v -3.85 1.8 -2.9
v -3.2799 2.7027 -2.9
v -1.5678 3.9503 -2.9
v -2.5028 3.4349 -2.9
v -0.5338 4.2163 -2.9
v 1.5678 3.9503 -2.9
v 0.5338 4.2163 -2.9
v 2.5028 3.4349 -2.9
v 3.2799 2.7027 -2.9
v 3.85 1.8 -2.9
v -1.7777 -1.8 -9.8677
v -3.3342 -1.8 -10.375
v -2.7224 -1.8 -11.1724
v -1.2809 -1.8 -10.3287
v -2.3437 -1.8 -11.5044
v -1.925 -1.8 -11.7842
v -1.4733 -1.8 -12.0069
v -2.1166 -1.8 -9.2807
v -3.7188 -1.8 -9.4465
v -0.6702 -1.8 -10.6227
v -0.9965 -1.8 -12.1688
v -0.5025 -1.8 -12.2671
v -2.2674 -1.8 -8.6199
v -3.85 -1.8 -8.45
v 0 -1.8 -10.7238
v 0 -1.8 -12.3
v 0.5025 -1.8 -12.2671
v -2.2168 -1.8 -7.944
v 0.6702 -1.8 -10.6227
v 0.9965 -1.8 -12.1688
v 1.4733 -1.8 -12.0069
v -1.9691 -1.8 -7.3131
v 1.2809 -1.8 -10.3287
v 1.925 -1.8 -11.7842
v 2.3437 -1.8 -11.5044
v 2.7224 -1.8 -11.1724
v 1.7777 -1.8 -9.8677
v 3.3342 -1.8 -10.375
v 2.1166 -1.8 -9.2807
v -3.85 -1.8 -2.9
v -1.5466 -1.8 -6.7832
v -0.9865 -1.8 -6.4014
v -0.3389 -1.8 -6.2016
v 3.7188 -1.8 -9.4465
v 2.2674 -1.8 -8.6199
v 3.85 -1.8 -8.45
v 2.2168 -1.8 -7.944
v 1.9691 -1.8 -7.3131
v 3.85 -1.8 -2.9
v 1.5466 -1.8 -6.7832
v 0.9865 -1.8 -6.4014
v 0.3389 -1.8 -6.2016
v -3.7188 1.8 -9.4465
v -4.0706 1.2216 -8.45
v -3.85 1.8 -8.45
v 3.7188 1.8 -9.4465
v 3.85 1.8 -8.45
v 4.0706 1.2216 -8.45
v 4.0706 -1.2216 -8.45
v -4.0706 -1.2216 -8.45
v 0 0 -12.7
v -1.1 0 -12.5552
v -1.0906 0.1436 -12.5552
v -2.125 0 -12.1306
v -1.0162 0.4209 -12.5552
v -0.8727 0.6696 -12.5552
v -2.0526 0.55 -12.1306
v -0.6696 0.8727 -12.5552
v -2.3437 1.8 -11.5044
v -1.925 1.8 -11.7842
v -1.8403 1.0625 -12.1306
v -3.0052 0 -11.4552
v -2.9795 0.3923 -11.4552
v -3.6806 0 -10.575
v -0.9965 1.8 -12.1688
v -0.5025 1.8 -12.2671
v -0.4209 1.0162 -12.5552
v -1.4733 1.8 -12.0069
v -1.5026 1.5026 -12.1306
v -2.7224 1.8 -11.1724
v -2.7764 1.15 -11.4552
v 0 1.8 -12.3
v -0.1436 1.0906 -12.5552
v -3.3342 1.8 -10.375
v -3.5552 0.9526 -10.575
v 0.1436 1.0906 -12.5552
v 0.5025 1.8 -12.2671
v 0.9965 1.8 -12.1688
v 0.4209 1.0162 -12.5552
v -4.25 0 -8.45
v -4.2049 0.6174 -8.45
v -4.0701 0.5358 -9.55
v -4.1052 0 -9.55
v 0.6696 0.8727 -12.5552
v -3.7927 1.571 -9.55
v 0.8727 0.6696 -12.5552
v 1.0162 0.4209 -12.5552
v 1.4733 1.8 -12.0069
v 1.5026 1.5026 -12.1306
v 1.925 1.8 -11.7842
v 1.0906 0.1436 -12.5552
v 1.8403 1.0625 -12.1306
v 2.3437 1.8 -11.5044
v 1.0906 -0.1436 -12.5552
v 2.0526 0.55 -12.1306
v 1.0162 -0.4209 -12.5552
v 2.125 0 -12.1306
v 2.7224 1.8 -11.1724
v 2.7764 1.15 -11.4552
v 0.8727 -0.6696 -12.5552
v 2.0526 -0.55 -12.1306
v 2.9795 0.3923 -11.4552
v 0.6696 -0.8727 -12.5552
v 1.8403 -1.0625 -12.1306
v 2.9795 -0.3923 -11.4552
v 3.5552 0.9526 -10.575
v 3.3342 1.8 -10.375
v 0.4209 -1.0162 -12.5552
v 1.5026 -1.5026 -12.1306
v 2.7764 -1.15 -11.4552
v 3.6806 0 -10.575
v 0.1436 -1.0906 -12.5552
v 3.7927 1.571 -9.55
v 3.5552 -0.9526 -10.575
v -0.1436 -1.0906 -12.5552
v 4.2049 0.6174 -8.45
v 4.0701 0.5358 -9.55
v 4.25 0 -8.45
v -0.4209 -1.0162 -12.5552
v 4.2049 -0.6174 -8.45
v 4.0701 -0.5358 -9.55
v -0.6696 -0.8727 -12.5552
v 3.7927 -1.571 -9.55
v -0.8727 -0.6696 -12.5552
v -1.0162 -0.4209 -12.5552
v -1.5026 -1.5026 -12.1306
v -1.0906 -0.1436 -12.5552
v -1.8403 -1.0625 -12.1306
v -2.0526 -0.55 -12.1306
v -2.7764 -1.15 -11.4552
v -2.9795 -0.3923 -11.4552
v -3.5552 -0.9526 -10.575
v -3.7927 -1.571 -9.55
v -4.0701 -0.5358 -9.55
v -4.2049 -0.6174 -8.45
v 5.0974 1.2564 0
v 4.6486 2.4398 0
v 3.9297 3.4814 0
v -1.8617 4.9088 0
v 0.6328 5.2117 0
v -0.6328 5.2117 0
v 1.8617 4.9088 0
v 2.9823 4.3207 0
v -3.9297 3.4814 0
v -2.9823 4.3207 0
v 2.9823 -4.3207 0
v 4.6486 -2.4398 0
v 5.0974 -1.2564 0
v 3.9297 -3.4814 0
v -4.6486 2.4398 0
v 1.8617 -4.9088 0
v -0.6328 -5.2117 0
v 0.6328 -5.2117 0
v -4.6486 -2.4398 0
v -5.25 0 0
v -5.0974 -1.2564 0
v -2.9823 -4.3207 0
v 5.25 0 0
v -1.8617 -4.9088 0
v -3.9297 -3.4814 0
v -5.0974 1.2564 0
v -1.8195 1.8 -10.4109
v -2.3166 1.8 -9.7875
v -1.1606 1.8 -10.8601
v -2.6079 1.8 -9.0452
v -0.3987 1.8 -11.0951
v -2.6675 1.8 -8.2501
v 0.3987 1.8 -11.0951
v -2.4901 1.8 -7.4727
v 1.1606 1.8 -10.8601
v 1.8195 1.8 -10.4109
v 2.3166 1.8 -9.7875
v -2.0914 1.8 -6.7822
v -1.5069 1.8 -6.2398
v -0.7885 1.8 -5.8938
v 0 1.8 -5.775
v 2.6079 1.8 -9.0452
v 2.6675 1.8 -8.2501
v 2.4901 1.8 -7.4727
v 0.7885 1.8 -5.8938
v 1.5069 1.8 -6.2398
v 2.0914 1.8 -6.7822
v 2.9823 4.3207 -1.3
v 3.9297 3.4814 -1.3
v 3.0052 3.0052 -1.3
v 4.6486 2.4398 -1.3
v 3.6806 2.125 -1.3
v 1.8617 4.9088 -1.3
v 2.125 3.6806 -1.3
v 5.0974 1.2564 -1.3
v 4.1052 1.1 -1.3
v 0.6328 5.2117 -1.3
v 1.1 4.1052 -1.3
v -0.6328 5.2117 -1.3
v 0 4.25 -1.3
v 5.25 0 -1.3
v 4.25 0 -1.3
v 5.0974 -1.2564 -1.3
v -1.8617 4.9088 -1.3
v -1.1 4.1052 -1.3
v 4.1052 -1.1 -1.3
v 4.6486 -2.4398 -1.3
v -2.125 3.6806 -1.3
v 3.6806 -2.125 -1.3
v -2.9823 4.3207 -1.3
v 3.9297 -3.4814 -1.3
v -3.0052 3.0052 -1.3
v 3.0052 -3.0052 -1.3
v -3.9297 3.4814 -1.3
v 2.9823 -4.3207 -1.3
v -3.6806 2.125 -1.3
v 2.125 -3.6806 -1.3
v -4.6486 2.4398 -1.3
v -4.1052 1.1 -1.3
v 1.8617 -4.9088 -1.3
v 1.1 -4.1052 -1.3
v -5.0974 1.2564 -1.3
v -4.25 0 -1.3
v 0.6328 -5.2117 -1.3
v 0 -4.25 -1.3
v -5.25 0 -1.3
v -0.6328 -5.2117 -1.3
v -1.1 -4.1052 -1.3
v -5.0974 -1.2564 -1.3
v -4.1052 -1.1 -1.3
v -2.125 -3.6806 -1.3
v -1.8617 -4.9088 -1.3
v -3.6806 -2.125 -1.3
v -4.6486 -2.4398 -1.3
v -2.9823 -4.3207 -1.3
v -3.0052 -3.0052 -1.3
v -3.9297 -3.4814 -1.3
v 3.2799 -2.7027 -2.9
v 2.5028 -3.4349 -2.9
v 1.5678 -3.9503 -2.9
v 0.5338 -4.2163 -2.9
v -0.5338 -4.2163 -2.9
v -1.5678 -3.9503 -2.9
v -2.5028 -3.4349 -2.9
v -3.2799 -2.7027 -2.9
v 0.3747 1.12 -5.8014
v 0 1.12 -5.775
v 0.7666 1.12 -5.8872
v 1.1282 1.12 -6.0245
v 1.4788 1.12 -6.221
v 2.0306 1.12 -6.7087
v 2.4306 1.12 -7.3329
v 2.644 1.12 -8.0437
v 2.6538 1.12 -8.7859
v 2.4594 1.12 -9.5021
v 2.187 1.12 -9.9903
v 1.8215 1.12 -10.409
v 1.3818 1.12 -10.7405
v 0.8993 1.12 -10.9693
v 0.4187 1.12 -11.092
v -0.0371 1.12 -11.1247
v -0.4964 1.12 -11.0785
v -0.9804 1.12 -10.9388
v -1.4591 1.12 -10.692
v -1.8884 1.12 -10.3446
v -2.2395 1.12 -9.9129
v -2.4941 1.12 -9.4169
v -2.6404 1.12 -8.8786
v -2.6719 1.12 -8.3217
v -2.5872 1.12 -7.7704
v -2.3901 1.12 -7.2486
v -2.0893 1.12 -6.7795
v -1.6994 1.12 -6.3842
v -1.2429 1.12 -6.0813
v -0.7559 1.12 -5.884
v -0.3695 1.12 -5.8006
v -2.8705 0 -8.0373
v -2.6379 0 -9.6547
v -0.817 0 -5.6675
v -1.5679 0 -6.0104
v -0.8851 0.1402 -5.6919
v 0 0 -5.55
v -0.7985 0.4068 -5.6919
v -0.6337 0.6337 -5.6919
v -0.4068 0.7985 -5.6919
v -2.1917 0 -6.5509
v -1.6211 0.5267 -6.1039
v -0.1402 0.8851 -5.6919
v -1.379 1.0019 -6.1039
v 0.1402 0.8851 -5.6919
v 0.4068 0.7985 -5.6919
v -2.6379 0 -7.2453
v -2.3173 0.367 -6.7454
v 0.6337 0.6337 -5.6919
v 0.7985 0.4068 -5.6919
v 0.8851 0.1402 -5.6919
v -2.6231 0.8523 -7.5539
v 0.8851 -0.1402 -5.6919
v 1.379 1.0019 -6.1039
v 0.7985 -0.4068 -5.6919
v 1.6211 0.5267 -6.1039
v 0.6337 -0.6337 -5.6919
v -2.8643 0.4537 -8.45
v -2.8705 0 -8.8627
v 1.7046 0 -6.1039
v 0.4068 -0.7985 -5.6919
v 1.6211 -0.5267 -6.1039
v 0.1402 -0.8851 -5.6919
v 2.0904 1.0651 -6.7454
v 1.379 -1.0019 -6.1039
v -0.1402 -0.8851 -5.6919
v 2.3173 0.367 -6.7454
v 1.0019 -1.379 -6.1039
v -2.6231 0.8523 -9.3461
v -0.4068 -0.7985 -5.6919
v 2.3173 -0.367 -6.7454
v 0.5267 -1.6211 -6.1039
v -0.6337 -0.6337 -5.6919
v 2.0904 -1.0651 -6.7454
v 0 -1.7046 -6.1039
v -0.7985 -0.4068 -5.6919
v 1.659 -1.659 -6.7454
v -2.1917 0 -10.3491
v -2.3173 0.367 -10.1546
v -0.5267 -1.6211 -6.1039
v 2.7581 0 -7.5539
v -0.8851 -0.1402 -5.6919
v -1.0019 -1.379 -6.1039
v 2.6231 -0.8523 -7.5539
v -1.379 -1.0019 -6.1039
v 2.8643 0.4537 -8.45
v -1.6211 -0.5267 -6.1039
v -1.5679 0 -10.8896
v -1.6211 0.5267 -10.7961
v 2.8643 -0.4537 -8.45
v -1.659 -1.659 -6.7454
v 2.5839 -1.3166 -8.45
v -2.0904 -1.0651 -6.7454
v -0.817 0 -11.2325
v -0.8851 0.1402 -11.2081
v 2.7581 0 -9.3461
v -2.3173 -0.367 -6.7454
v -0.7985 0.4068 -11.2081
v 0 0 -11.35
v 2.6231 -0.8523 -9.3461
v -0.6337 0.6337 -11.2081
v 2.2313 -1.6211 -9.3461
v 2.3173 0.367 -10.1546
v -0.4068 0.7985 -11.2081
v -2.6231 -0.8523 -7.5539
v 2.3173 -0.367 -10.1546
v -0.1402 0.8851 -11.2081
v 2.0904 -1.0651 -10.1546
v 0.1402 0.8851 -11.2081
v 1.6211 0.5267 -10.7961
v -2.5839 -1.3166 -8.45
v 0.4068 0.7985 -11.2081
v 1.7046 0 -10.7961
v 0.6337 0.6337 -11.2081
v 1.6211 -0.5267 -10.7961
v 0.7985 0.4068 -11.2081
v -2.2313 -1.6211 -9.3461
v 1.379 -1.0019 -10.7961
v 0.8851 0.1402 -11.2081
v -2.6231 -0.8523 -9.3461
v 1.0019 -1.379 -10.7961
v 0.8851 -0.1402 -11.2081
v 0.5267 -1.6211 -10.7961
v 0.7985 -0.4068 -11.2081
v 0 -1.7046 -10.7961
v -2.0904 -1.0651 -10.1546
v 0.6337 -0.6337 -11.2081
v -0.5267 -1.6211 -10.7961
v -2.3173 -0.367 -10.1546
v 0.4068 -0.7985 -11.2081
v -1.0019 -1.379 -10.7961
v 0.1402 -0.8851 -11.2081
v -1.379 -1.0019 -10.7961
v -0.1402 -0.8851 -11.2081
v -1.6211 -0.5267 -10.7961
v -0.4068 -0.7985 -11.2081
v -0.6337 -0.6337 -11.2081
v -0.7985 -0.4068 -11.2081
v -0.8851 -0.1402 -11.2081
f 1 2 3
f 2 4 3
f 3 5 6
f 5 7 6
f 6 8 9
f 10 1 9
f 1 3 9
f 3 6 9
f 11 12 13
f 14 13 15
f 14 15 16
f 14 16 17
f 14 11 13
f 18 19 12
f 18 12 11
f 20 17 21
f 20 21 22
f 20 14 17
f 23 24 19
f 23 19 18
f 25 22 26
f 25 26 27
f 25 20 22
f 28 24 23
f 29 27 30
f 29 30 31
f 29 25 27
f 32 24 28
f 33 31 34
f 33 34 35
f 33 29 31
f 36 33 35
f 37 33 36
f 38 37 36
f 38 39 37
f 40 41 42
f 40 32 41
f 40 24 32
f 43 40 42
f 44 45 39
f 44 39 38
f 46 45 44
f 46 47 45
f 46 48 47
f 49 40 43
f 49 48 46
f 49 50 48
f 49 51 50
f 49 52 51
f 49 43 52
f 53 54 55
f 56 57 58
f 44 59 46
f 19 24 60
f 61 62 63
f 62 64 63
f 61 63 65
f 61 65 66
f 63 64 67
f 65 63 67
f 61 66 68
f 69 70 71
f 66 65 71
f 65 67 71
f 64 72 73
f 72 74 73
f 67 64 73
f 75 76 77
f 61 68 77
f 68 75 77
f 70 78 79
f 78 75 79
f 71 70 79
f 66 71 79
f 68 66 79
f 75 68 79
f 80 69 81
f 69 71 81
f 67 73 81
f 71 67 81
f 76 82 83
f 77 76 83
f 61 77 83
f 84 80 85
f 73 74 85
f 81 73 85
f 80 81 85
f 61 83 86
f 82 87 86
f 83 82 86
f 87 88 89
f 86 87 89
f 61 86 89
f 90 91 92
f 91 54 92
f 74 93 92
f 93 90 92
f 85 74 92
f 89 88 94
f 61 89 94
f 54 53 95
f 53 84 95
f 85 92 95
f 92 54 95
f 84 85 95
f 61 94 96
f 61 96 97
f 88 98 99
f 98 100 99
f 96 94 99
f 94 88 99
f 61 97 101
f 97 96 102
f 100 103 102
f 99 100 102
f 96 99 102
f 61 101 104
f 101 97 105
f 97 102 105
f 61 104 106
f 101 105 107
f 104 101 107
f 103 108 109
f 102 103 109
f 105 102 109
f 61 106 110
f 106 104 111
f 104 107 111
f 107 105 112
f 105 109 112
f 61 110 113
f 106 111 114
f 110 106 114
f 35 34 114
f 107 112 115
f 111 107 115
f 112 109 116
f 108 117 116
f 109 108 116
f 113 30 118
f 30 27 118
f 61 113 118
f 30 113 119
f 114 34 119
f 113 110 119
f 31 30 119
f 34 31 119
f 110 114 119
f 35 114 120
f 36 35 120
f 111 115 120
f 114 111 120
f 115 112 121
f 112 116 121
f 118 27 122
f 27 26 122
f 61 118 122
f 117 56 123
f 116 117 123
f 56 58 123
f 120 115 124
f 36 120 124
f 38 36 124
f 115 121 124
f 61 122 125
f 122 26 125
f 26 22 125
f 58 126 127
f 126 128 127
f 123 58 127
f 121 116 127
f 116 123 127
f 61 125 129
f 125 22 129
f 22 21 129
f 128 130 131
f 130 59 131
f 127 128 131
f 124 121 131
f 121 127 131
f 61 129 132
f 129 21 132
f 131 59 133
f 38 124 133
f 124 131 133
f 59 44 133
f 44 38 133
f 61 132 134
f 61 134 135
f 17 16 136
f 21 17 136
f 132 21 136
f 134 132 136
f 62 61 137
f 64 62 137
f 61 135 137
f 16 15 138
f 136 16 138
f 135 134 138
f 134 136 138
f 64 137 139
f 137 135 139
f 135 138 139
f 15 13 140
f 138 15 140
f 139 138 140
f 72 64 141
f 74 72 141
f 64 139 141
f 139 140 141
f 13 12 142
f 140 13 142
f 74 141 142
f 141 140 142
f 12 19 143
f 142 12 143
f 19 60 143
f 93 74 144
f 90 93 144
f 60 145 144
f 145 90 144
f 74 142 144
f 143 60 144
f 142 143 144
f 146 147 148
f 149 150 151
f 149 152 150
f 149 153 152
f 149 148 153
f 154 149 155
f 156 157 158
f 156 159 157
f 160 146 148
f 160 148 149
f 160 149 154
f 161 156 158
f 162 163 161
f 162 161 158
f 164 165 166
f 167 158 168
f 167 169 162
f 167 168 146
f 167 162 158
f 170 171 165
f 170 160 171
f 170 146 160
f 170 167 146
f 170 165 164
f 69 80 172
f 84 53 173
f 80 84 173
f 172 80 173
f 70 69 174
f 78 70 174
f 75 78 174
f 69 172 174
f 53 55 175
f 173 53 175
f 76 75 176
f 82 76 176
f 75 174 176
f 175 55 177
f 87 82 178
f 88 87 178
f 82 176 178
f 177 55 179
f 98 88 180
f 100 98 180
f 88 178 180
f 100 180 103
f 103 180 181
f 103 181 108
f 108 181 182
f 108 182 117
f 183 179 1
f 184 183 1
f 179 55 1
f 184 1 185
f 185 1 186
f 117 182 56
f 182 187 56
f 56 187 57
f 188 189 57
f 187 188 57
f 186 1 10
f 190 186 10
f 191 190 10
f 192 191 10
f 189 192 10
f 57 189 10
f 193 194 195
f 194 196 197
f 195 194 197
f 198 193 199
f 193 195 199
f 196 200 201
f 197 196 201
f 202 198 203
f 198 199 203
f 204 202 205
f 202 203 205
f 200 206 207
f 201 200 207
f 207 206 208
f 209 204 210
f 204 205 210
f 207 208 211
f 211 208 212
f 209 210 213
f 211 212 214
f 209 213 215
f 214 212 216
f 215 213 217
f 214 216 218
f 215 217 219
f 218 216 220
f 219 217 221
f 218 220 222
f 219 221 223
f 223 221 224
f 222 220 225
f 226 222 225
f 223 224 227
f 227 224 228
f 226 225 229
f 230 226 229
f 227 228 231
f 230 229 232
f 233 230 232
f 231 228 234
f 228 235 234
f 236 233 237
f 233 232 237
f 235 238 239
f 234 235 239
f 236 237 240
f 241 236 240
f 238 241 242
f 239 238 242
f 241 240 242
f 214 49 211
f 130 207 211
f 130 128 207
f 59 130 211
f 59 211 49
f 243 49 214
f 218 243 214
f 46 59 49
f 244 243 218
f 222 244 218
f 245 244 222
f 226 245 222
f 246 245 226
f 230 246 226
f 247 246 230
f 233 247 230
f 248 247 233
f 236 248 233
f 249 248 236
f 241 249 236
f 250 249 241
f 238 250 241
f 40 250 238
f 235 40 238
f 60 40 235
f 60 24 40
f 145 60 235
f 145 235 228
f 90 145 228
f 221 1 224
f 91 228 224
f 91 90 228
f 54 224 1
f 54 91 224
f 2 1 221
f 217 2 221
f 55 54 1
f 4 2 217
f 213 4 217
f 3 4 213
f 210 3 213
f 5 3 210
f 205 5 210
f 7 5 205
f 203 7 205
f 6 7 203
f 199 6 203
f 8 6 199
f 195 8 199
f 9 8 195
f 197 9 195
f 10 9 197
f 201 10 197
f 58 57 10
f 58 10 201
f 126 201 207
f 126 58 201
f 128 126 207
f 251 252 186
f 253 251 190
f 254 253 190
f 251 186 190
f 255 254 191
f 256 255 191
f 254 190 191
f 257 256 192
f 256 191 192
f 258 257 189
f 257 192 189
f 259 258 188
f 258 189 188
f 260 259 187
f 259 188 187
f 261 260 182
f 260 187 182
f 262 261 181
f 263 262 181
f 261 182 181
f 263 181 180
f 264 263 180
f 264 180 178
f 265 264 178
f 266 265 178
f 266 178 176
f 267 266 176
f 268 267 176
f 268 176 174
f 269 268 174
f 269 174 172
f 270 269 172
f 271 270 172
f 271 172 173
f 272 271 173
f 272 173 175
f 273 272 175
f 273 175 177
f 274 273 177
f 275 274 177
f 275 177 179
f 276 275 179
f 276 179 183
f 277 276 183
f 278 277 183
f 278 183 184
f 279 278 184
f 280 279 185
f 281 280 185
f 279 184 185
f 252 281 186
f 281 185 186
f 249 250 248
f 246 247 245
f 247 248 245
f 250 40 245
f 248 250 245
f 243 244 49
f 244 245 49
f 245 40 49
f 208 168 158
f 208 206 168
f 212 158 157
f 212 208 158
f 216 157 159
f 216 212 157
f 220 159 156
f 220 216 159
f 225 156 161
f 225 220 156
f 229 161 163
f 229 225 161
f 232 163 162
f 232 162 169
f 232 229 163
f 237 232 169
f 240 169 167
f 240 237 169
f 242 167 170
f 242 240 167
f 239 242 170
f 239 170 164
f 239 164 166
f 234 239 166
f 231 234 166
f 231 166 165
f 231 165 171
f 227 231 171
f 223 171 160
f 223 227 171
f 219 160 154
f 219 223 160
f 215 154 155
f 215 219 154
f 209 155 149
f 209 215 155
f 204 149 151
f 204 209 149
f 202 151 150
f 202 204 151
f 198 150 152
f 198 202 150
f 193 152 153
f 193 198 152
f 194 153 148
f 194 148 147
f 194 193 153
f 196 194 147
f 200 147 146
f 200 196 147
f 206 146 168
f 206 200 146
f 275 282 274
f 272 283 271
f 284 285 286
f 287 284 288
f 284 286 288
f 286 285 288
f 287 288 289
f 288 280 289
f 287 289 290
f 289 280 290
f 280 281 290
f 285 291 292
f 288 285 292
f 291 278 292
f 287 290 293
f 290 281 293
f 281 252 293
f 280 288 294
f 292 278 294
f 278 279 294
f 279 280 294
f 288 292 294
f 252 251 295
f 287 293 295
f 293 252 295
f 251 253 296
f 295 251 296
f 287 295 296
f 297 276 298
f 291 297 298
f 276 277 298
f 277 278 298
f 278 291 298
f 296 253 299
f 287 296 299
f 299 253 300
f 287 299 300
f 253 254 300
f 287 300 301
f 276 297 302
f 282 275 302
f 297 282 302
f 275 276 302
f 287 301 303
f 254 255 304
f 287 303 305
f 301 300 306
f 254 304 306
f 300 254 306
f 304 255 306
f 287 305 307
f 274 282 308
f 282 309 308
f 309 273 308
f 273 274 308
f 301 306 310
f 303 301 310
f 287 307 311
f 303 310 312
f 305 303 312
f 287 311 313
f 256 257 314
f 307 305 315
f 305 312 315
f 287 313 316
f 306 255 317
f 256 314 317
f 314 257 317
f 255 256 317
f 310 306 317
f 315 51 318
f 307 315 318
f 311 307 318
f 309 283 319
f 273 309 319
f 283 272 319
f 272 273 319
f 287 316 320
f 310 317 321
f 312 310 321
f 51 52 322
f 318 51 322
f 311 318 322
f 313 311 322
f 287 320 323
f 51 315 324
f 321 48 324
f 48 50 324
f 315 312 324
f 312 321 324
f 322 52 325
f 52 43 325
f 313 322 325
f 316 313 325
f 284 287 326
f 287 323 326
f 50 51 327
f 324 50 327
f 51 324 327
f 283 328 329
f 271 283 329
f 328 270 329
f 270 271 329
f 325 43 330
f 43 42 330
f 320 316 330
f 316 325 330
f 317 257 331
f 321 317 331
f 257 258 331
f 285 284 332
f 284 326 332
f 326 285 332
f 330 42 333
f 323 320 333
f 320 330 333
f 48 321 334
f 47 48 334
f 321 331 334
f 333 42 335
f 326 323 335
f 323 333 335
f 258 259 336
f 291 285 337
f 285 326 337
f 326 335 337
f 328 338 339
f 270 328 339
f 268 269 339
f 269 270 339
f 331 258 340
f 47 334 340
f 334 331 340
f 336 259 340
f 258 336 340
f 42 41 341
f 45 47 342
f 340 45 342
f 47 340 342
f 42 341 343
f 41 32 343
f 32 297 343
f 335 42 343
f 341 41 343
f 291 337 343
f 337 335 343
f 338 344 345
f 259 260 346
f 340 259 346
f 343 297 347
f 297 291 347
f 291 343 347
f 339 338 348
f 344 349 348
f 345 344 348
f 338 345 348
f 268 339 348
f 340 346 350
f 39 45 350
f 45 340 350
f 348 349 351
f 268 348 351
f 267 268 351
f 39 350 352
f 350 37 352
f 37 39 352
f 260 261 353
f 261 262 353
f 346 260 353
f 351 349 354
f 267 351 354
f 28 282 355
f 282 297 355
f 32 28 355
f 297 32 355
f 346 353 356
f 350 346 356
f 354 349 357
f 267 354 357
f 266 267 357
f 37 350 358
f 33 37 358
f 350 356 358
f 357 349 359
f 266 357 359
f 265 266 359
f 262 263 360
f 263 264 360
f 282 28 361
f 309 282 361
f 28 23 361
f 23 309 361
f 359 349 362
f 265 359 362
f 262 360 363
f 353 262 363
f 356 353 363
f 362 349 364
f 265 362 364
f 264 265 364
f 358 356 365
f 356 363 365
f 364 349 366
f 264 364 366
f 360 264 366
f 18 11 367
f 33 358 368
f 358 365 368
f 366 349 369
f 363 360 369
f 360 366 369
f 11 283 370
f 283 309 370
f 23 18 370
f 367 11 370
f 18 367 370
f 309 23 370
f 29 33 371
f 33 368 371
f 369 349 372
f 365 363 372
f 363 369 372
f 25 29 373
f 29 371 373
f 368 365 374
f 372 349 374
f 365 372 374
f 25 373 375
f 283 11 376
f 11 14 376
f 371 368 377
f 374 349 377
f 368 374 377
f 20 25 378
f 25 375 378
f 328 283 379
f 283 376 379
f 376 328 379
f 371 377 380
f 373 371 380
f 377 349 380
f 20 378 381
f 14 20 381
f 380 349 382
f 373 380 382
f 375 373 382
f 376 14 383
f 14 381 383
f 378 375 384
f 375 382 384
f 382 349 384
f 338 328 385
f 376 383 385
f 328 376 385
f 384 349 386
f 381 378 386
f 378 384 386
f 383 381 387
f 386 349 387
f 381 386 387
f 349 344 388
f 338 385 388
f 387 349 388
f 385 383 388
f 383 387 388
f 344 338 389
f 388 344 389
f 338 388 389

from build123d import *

# Parameters (mm, degrees)
CUT_EXTRUDE_START    = -2.9
SKETCH_2_OUTSIDE_W   = 16.408
SKETCH_2_OUTSIDE_H   = 16.408
SKETCH_2_OUTSIDE_W_2 = 15
SKETCH_2_OUTSIDE_H_2 = 3.6
CUT_EXTRUDE_1_DEPTH  = 10
CUT_EXTRUDE_2_REACH  = 17.445
SKETCH_3_R           = 2.675


with BuildPart() as part:
    # Эскиз1 → Повернуть1 (revolve)
    with BuildSketch(Plane(origin=(0, 0, 0), x_dir=(1, 0, 0), z_dir=(0, 1, 0))):
        with BuildLine():
            Line((0, 0), (5.25, 0))
            Line((5.25, 0), (5.25, 1.3))
            Line((5.25, 1.3), (4.25, 1.3))
            Line((4.25, 1.3), (4.25, 8.45))
            ThreePointArc((4.25, 8.45), (3.00520382, 11.45520382), (0, 12.7))
            Line((0, 12.7), (0, 11.35))
            ThreePointArc((0, 11.35), (2.9, 8.45), (0, 5.55))
            Line((0, 5.55), (0, 0))
        make_face()
    revolve(axis=Axis((0, 0, -1.3), (0, 0, -1)))

    # Эскиз2 outside → Вырез-Вытянуть1 (cut)
    with BuildSketch(Plane.XY.offset(CUT_EXTRUDE_START)):
        Rectangle(SKETCH_2_OUTSIDE_W, SKETCH_2_OUTSIDE_H)
        Rectangle(SKETCH_2_OUTSIDE_W_2, SKETCH_2_OUTSIDE_H_2, mode=Mode.SUBTRACT)
    extrude(amount=-CUT_EXTRUDE_1_DEPTH, mode=Mode.SUBTRACT)

    # Эскиз3 → Вырез-Вытянуть2 (cut, up to next)
    with BuildSketch(Plane(origin=(0, 1.8, 0), x_dir=(1, 0, 0), z_dir=(0, 1, 0)), mode=Mode.PRIVATE) as cut_extrude_2_sk1:
        with Locations((0, 8.45)):
            Circle(SKETCH_3_R)
    cut_extrude_2_tool1 = extrude(cut_extrude_2_sk1.sketch, amount=-CUT_EXTRUDE_2_REACH, mode=Mode.PRIVATE) & part.part
    add(cut_extrude_2_tool1.solids().sort_by_distance((0, 1.8, -8.45))[0], mode=Mode.SUBTRACT)


solid = part.part
